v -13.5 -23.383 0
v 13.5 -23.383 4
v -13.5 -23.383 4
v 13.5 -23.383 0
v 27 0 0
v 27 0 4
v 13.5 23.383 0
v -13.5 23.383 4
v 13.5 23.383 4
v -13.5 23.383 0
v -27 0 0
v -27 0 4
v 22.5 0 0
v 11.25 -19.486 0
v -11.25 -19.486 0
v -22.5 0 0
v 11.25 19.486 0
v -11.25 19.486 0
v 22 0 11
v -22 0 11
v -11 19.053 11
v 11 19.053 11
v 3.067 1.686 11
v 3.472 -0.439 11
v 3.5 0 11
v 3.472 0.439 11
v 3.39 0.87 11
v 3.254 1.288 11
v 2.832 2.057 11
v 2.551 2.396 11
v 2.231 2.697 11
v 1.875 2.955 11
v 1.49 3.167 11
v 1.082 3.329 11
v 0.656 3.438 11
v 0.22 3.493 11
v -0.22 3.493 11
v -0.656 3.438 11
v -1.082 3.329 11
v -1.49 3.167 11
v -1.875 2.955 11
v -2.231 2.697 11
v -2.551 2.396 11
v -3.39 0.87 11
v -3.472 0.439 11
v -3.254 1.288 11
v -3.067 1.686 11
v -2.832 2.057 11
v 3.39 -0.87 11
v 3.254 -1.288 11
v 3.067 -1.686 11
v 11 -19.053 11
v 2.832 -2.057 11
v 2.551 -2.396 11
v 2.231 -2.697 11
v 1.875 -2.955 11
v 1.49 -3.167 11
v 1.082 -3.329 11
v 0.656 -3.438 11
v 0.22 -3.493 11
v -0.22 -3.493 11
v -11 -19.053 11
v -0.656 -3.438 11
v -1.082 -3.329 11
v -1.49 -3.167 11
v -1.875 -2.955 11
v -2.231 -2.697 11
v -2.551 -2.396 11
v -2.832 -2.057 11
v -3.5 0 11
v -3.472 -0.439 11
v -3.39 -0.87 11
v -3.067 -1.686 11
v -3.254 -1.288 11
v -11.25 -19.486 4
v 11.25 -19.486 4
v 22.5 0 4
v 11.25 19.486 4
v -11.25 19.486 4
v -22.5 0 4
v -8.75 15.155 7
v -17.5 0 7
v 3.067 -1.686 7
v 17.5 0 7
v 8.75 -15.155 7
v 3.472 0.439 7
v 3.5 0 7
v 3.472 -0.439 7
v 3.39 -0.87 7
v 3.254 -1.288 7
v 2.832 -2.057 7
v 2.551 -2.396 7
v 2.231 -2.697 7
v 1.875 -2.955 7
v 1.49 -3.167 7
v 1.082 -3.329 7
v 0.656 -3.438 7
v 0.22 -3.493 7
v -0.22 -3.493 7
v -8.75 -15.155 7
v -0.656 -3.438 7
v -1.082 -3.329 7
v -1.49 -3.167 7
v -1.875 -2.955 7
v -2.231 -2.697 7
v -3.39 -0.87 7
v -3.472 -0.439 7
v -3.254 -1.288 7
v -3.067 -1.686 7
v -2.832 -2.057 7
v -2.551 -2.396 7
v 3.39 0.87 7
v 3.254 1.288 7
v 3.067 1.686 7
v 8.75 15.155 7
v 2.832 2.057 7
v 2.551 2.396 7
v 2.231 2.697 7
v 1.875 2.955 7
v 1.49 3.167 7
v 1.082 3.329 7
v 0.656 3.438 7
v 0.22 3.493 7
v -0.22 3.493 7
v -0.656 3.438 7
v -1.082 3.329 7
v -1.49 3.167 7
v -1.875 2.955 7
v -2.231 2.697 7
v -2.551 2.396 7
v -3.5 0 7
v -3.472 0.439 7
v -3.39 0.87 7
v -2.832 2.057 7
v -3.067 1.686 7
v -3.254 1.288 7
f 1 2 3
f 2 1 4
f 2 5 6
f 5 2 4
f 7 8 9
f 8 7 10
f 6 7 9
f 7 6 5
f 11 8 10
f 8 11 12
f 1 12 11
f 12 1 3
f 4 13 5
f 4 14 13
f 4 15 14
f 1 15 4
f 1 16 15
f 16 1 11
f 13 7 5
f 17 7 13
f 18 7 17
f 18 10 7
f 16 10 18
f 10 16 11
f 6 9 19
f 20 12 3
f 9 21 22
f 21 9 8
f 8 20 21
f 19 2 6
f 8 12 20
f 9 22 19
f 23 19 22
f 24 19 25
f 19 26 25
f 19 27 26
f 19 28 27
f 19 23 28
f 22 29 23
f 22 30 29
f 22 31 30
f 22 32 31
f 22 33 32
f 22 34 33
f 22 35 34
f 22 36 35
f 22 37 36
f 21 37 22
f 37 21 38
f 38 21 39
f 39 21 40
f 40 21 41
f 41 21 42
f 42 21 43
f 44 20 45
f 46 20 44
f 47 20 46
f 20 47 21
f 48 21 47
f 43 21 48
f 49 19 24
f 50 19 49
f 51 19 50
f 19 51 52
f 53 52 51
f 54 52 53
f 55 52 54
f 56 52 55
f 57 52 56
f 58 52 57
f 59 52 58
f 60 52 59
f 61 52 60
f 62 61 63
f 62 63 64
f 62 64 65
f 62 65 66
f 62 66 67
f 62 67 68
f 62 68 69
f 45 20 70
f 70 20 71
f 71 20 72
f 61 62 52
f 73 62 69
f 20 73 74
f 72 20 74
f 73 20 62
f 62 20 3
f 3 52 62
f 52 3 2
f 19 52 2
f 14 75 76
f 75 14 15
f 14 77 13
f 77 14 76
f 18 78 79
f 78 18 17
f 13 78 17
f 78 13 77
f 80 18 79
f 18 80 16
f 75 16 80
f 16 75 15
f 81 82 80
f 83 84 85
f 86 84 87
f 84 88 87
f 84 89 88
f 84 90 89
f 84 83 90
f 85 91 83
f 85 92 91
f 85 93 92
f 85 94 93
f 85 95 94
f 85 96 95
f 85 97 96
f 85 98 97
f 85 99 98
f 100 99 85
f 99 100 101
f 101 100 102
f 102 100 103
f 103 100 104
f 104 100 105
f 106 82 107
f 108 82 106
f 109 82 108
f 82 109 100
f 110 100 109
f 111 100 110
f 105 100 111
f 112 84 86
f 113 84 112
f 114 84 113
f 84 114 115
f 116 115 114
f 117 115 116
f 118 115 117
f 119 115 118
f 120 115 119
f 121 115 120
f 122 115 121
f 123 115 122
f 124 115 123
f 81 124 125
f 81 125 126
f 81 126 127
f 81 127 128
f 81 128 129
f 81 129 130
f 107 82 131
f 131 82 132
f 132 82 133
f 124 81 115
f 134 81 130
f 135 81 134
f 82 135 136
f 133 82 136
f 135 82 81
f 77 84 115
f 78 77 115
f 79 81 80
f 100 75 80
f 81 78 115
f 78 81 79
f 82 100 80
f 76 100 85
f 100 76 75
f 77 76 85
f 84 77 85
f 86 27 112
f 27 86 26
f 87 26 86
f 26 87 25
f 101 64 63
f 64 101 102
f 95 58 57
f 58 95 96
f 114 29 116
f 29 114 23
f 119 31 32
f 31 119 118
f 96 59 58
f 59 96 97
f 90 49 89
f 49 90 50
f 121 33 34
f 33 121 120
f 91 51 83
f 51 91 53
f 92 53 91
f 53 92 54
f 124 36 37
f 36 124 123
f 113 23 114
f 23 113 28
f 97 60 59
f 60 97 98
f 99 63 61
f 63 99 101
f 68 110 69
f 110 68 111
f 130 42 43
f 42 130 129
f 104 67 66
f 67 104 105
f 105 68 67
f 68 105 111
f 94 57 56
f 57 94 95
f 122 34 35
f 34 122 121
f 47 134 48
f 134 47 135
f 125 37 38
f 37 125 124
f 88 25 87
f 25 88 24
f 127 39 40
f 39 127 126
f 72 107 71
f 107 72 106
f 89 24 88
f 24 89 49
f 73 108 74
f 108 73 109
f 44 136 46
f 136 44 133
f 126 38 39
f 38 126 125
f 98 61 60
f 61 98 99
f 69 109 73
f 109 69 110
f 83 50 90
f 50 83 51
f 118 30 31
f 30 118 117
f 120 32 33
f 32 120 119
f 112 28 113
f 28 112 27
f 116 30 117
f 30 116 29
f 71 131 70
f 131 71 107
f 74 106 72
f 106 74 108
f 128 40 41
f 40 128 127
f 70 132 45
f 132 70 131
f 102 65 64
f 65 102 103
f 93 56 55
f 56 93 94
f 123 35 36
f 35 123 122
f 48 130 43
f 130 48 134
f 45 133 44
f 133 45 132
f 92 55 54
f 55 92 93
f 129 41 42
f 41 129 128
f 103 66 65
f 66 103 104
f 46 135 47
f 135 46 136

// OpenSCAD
OUTER_DIA_BOT = 54;
OUTER_DIA_TOP = 44;
INNER_DIA_BOT = 45;
INNER_DIA_TOP = 35;
INNER_VOID_THICKNESS = 7;
THICKNESS = 11;
LIP_THICKNESS = 4;
MOUNT_HOLE_DIA = 7;

$fn = 50;

module void() {
  union() {
    cylinder(d = INNER_DIA_BOT, h = LIP_THICKNESS, $fn = 6);
    translate([0, 0, LIP_THICKNESS])
    cylinder(d1 = INNER_DIA_BOT, d2 = INNER_DIA_TOP, h = INNER_VOID_THICKNESS - LIP_THICKNESS, $fn = 6);
    cylinder(d = MOUNT_HOLE_DIA, h = THICKNESS);
  }
}

module base() {
  difference() {
    union() {
      cylinder(d = OUTER_DIA_BOT, h = LIP_THICKNESS, $fn = 6);
      translate([0, 0, LIP_THICKNESS])
      cylinder(d1 = OUTER_DIA_BOT, d2 = OUTER_DIA_TOP, h = THICKNESS - LIP_THICKNESS, $fn = 6);
    }
    void();
  }
}

base();
